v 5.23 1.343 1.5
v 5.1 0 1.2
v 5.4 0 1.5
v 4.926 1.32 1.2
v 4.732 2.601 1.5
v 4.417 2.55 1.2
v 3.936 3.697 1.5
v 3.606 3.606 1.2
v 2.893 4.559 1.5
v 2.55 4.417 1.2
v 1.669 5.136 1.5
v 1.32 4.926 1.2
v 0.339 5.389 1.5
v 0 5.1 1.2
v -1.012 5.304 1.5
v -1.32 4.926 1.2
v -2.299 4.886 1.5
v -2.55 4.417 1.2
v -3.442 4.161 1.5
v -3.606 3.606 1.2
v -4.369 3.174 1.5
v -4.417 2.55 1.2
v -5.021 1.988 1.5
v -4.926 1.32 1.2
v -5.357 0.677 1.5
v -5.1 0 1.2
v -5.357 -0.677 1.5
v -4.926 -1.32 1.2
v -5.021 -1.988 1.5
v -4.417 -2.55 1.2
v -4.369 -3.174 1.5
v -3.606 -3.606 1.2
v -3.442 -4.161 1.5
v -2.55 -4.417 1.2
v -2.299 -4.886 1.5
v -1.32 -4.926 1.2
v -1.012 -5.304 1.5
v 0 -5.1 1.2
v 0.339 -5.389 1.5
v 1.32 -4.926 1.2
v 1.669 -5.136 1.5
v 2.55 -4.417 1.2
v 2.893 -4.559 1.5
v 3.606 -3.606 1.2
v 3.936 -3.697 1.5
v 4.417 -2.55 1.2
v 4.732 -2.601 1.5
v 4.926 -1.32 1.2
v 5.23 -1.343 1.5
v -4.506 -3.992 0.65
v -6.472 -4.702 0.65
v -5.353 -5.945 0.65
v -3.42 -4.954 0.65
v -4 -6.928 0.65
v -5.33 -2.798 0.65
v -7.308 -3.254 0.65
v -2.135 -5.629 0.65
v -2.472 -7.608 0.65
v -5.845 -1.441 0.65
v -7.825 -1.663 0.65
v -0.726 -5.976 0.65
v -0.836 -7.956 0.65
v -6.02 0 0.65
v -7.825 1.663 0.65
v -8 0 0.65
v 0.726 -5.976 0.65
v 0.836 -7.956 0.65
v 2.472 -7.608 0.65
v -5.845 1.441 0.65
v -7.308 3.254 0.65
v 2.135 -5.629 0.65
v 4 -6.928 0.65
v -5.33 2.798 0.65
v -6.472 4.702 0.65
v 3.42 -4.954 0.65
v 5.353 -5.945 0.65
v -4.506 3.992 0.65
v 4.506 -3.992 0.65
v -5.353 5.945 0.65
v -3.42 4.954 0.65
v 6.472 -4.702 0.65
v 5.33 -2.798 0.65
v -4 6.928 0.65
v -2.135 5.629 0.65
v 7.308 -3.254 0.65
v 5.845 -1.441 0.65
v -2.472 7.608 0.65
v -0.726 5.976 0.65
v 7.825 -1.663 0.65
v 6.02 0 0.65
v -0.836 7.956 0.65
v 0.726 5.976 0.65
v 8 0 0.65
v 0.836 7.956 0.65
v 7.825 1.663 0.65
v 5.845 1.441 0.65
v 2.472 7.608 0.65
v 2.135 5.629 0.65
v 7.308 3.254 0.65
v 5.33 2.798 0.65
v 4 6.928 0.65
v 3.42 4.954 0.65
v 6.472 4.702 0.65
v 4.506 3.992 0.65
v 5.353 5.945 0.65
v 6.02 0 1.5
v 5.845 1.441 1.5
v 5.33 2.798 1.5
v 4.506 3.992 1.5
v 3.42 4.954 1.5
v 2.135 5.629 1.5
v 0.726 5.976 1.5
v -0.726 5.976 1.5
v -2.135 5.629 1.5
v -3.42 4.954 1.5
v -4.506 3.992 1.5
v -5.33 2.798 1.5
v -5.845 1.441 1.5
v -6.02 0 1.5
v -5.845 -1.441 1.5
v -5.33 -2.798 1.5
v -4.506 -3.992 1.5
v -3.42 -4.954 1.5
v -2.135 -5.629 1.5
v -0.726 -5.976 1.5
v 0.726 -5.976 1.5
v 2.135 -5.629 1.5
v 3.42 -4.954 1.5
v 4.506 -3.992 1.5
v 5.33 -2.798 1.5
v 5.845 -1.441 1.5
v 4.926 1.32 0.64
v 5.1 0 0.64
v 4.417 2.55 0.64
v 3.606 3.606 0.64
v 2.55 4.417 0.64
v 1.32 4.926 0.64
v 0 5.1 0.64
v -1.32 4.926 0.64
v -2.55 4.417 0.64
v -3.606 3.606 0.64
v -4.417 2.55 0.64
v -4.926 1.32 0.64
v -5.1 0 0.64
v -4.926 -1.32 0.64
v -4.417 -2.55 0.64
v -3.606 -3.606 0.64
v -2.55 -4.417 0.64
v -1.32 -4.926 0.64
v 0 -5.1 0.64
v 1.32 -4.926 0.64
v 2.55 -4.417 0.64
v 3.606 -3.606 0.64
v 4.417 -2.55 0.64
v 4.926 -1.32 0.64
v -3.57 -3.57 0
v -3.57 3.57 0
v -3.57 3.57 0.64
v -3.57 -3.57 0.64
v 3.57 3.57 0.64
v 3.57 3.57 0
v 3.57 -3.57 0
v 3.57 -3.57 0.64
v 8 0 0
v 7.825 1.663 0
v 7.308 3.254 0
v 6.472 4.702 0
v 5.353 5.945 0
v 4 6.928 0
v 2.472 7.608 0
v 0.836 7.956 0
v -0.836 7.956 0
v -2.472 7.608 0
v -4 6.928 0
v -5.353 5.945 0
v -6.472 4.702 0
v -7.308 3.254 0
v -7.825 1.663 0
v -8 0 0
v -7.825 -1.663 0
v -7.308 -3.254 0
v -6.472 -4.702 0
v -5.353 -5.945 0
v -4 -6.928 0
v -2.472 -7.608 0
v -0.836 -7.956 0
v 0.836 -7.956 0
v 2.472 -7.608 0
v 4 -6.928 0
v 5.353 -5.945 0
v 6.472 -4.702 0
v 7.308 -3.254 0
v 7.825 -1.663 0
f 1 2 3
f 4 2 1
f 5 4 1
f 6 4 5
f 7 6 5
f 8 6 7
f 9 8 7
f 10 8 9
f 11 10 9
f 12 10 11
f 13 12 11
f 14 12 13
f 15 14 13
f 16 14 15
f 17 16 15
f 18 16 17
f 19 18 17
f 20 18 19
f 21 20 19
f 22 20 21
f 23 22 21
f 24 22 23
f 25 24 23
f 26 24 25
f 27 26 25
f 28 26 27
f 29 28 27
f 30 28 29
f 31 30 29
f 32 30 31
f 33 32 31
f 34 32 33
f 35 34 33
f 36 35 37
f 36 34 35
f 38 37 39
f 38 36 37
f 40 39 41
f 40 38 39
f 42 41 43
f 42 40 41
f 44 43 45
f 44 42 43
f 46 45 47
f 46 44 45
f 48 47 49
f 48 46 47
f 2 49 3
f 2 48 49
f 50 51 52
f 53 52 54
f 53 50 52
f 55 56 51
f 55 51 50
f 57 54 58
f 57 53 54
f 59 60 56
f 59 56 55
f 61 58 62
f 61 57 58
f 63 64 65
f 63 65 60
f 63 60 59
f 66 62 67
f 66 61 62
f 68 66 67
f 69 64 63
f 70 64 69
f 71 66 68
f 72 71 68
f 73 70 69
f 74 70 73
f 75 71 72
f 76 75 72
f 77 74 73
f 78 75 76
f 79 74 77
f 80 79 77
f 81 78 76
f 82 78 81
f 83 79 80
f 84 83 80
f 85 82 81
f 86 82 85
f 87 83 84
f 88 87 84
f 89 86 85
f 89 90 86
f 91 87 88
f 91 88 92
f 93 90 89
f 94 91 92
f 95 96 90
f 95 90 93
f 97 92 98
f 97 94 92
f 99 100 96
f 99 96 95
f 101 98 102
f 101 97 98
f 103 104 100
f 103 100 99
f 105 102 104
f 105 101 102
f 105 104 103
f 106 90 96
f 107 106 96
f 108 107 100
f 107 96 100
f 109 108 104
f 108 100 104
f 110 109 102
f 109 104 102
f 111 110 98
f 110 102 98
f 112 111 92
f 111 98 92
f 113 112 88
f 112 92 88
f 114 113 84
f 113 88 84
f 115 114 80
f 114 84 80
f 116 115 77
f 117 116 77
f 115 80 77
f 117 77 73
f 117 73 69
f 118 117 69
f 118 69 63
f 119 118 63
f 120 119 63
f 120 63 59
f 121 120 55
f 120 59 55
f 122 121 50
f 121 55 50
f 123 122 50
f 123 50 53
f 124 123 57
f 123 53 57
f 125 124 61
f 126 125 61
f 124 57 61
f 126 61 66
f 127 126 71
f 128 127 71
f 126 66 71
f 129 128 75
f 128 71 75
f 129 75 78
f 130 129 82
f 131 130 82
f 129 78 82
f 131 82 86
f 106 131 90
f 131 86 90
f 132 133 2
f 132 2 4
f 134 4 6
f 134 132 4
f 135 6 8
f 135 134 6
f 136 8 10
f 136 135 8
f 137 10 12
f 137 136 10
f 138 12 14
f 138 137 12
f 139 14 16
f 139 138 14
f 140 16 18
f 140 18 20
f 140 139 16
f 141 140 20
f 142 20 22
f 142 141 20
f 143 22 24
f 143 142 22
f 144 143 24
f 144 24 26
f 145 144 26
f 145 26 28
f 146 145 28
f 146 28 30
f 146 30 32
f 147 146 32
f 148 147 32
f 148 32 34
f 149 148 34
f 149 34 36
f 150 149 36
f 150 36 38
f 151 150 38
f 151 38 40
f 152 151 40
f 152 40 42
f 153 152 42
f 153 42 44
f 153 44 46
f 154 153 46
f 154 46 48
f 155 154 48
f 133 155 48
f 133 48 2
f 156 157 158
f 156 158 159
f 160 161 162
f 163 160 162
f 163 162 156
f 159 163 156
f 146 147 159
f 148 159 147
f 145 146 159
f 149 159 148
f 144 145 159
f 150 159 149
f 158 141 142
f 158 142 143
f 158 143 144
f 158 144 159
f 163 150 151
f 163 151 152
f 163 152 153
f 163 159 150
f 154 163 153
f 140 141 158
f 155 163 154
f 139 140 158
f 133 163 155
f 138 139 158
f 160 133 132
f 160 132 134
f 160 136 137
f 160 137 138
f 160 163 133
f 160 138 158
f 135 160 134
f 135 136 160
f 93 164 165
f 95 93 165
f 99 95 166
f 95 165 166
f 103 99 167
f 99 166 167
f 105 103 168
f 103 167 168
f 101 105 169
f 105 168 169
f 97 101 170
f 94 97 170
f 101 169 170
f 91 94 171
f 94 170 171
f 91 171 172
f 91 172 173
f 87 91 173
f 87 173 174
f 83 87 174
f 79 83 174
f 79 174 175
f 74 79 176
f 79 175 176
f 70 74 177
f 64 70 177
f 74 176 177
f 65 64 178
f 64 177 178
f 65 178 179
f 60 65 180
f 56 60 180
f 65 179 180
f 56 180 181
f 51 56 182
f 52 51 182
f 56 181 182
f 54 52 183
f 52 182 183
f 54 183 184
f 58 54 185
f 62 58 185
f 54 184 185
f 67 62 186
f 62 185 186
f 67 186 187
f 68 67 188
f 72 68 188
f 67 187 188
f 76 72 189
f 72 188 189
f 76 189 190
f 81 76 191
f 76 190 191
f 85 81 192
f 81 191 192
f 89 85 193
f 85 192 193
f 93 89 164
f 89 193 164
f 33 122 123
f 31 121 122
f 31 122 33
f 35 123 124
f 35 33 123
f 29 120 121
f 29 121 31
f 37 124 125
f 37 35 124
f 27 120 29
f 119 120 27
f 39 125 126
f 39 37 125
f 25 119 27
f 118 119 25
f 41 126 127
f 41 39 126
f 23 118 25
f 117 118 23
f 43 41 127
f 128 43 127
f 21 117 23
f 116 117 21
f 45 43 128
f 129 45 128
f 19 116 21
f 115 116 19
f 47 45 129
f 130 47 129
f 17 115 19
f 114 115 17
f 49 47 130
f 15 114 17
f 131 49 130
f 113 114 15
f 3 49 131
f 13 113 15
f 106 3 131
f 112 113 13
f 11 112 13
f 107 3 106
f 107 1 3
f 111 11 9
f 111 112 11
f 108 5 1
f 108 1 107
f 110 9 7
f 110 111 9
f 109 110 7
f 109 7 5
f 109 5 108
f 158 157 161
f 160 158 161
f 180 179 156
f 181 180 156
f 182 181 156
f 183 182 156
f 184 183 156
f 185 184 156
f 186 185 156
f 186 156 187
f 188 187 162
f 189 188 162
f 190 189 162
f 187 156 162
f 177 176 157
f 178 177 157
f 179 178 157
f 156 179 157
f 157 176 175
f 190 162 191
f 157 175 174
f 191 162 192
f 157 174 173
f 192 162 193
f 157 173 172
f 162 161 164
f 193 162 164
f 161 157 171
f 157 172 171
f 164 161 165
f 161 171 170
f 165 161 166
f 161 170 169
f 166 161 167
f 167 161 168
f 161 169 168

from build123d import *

# Parameters (mm, degrees)
SKETCH_1_R          = 8
EXTRUDE_1_DEPTH     = 0.65
EXTRUDE_START       = 0.65
SKETCH_2_R          = 6.02
SKETCH_2_R_2        = 5.1
EXTRUDE_2_DEPTH     = 0.85
CUT_EXTRUDE_START   = 0.65
SKETCH_3_R          = 5.1
CUT_EXTRUDE_1_DEPTH = 0.01
CUT_EXTRUDE_2_DEPTH = 0.64
CHAMFER_1_SIZE      = 0.3


with BuildPart() as part:
    # 草图1 → 凸台-拉伸1 (new body)
    with BuildSketch(Plane.XY):
        Circle(SKETCH_1_R)
    extrude(amount=EXTRUDE_1_DEPTH)

    # 草图2 → 凸台-拉伸2 (add)
    with BuildSketch(Plane.XY.offset(EXTRUDE_START)):
        Circle(SKETCH_2_R)
        Circle(SKETCH_2_R_2, mode=Mode.SUBTRACT)
    extrude(amount=EXTRUDE_2_DEPTH)

    # 草图3 → 切除-拉伸1 (cut)
    with BuildSketch(Plane.XY.offset(CUT_EXTRUDE_START)):
        Circle(SKETCH_3_R)
    extrude(amount=-CUT_EXTRUDE_1_DEPTH, mode=Mode.SUBTRACT)

    # 草图4 → 切除-拉伸2 (cut)
    with BuildSketch(Plane.XY):
        Polygon((-3.57, 3.57), (3.57, 3.57), (3.57, -3.57), (-3.57, -3.57), (-3.57, 0), align=None)
    extrude(amount=CUT_EXTRUDE_2_DEPTH, mode=Mode.SUBTRACT)

    # 倒角1
    chamfer_1_edges = [part.edges().sort_by_distance(p)[0] for p in [
        (-5.1, 0, 1.5),
    ]]
    chamfer(chamfer_1_edges, length=CHAMFER_1_SIZE)


solid = part.part
